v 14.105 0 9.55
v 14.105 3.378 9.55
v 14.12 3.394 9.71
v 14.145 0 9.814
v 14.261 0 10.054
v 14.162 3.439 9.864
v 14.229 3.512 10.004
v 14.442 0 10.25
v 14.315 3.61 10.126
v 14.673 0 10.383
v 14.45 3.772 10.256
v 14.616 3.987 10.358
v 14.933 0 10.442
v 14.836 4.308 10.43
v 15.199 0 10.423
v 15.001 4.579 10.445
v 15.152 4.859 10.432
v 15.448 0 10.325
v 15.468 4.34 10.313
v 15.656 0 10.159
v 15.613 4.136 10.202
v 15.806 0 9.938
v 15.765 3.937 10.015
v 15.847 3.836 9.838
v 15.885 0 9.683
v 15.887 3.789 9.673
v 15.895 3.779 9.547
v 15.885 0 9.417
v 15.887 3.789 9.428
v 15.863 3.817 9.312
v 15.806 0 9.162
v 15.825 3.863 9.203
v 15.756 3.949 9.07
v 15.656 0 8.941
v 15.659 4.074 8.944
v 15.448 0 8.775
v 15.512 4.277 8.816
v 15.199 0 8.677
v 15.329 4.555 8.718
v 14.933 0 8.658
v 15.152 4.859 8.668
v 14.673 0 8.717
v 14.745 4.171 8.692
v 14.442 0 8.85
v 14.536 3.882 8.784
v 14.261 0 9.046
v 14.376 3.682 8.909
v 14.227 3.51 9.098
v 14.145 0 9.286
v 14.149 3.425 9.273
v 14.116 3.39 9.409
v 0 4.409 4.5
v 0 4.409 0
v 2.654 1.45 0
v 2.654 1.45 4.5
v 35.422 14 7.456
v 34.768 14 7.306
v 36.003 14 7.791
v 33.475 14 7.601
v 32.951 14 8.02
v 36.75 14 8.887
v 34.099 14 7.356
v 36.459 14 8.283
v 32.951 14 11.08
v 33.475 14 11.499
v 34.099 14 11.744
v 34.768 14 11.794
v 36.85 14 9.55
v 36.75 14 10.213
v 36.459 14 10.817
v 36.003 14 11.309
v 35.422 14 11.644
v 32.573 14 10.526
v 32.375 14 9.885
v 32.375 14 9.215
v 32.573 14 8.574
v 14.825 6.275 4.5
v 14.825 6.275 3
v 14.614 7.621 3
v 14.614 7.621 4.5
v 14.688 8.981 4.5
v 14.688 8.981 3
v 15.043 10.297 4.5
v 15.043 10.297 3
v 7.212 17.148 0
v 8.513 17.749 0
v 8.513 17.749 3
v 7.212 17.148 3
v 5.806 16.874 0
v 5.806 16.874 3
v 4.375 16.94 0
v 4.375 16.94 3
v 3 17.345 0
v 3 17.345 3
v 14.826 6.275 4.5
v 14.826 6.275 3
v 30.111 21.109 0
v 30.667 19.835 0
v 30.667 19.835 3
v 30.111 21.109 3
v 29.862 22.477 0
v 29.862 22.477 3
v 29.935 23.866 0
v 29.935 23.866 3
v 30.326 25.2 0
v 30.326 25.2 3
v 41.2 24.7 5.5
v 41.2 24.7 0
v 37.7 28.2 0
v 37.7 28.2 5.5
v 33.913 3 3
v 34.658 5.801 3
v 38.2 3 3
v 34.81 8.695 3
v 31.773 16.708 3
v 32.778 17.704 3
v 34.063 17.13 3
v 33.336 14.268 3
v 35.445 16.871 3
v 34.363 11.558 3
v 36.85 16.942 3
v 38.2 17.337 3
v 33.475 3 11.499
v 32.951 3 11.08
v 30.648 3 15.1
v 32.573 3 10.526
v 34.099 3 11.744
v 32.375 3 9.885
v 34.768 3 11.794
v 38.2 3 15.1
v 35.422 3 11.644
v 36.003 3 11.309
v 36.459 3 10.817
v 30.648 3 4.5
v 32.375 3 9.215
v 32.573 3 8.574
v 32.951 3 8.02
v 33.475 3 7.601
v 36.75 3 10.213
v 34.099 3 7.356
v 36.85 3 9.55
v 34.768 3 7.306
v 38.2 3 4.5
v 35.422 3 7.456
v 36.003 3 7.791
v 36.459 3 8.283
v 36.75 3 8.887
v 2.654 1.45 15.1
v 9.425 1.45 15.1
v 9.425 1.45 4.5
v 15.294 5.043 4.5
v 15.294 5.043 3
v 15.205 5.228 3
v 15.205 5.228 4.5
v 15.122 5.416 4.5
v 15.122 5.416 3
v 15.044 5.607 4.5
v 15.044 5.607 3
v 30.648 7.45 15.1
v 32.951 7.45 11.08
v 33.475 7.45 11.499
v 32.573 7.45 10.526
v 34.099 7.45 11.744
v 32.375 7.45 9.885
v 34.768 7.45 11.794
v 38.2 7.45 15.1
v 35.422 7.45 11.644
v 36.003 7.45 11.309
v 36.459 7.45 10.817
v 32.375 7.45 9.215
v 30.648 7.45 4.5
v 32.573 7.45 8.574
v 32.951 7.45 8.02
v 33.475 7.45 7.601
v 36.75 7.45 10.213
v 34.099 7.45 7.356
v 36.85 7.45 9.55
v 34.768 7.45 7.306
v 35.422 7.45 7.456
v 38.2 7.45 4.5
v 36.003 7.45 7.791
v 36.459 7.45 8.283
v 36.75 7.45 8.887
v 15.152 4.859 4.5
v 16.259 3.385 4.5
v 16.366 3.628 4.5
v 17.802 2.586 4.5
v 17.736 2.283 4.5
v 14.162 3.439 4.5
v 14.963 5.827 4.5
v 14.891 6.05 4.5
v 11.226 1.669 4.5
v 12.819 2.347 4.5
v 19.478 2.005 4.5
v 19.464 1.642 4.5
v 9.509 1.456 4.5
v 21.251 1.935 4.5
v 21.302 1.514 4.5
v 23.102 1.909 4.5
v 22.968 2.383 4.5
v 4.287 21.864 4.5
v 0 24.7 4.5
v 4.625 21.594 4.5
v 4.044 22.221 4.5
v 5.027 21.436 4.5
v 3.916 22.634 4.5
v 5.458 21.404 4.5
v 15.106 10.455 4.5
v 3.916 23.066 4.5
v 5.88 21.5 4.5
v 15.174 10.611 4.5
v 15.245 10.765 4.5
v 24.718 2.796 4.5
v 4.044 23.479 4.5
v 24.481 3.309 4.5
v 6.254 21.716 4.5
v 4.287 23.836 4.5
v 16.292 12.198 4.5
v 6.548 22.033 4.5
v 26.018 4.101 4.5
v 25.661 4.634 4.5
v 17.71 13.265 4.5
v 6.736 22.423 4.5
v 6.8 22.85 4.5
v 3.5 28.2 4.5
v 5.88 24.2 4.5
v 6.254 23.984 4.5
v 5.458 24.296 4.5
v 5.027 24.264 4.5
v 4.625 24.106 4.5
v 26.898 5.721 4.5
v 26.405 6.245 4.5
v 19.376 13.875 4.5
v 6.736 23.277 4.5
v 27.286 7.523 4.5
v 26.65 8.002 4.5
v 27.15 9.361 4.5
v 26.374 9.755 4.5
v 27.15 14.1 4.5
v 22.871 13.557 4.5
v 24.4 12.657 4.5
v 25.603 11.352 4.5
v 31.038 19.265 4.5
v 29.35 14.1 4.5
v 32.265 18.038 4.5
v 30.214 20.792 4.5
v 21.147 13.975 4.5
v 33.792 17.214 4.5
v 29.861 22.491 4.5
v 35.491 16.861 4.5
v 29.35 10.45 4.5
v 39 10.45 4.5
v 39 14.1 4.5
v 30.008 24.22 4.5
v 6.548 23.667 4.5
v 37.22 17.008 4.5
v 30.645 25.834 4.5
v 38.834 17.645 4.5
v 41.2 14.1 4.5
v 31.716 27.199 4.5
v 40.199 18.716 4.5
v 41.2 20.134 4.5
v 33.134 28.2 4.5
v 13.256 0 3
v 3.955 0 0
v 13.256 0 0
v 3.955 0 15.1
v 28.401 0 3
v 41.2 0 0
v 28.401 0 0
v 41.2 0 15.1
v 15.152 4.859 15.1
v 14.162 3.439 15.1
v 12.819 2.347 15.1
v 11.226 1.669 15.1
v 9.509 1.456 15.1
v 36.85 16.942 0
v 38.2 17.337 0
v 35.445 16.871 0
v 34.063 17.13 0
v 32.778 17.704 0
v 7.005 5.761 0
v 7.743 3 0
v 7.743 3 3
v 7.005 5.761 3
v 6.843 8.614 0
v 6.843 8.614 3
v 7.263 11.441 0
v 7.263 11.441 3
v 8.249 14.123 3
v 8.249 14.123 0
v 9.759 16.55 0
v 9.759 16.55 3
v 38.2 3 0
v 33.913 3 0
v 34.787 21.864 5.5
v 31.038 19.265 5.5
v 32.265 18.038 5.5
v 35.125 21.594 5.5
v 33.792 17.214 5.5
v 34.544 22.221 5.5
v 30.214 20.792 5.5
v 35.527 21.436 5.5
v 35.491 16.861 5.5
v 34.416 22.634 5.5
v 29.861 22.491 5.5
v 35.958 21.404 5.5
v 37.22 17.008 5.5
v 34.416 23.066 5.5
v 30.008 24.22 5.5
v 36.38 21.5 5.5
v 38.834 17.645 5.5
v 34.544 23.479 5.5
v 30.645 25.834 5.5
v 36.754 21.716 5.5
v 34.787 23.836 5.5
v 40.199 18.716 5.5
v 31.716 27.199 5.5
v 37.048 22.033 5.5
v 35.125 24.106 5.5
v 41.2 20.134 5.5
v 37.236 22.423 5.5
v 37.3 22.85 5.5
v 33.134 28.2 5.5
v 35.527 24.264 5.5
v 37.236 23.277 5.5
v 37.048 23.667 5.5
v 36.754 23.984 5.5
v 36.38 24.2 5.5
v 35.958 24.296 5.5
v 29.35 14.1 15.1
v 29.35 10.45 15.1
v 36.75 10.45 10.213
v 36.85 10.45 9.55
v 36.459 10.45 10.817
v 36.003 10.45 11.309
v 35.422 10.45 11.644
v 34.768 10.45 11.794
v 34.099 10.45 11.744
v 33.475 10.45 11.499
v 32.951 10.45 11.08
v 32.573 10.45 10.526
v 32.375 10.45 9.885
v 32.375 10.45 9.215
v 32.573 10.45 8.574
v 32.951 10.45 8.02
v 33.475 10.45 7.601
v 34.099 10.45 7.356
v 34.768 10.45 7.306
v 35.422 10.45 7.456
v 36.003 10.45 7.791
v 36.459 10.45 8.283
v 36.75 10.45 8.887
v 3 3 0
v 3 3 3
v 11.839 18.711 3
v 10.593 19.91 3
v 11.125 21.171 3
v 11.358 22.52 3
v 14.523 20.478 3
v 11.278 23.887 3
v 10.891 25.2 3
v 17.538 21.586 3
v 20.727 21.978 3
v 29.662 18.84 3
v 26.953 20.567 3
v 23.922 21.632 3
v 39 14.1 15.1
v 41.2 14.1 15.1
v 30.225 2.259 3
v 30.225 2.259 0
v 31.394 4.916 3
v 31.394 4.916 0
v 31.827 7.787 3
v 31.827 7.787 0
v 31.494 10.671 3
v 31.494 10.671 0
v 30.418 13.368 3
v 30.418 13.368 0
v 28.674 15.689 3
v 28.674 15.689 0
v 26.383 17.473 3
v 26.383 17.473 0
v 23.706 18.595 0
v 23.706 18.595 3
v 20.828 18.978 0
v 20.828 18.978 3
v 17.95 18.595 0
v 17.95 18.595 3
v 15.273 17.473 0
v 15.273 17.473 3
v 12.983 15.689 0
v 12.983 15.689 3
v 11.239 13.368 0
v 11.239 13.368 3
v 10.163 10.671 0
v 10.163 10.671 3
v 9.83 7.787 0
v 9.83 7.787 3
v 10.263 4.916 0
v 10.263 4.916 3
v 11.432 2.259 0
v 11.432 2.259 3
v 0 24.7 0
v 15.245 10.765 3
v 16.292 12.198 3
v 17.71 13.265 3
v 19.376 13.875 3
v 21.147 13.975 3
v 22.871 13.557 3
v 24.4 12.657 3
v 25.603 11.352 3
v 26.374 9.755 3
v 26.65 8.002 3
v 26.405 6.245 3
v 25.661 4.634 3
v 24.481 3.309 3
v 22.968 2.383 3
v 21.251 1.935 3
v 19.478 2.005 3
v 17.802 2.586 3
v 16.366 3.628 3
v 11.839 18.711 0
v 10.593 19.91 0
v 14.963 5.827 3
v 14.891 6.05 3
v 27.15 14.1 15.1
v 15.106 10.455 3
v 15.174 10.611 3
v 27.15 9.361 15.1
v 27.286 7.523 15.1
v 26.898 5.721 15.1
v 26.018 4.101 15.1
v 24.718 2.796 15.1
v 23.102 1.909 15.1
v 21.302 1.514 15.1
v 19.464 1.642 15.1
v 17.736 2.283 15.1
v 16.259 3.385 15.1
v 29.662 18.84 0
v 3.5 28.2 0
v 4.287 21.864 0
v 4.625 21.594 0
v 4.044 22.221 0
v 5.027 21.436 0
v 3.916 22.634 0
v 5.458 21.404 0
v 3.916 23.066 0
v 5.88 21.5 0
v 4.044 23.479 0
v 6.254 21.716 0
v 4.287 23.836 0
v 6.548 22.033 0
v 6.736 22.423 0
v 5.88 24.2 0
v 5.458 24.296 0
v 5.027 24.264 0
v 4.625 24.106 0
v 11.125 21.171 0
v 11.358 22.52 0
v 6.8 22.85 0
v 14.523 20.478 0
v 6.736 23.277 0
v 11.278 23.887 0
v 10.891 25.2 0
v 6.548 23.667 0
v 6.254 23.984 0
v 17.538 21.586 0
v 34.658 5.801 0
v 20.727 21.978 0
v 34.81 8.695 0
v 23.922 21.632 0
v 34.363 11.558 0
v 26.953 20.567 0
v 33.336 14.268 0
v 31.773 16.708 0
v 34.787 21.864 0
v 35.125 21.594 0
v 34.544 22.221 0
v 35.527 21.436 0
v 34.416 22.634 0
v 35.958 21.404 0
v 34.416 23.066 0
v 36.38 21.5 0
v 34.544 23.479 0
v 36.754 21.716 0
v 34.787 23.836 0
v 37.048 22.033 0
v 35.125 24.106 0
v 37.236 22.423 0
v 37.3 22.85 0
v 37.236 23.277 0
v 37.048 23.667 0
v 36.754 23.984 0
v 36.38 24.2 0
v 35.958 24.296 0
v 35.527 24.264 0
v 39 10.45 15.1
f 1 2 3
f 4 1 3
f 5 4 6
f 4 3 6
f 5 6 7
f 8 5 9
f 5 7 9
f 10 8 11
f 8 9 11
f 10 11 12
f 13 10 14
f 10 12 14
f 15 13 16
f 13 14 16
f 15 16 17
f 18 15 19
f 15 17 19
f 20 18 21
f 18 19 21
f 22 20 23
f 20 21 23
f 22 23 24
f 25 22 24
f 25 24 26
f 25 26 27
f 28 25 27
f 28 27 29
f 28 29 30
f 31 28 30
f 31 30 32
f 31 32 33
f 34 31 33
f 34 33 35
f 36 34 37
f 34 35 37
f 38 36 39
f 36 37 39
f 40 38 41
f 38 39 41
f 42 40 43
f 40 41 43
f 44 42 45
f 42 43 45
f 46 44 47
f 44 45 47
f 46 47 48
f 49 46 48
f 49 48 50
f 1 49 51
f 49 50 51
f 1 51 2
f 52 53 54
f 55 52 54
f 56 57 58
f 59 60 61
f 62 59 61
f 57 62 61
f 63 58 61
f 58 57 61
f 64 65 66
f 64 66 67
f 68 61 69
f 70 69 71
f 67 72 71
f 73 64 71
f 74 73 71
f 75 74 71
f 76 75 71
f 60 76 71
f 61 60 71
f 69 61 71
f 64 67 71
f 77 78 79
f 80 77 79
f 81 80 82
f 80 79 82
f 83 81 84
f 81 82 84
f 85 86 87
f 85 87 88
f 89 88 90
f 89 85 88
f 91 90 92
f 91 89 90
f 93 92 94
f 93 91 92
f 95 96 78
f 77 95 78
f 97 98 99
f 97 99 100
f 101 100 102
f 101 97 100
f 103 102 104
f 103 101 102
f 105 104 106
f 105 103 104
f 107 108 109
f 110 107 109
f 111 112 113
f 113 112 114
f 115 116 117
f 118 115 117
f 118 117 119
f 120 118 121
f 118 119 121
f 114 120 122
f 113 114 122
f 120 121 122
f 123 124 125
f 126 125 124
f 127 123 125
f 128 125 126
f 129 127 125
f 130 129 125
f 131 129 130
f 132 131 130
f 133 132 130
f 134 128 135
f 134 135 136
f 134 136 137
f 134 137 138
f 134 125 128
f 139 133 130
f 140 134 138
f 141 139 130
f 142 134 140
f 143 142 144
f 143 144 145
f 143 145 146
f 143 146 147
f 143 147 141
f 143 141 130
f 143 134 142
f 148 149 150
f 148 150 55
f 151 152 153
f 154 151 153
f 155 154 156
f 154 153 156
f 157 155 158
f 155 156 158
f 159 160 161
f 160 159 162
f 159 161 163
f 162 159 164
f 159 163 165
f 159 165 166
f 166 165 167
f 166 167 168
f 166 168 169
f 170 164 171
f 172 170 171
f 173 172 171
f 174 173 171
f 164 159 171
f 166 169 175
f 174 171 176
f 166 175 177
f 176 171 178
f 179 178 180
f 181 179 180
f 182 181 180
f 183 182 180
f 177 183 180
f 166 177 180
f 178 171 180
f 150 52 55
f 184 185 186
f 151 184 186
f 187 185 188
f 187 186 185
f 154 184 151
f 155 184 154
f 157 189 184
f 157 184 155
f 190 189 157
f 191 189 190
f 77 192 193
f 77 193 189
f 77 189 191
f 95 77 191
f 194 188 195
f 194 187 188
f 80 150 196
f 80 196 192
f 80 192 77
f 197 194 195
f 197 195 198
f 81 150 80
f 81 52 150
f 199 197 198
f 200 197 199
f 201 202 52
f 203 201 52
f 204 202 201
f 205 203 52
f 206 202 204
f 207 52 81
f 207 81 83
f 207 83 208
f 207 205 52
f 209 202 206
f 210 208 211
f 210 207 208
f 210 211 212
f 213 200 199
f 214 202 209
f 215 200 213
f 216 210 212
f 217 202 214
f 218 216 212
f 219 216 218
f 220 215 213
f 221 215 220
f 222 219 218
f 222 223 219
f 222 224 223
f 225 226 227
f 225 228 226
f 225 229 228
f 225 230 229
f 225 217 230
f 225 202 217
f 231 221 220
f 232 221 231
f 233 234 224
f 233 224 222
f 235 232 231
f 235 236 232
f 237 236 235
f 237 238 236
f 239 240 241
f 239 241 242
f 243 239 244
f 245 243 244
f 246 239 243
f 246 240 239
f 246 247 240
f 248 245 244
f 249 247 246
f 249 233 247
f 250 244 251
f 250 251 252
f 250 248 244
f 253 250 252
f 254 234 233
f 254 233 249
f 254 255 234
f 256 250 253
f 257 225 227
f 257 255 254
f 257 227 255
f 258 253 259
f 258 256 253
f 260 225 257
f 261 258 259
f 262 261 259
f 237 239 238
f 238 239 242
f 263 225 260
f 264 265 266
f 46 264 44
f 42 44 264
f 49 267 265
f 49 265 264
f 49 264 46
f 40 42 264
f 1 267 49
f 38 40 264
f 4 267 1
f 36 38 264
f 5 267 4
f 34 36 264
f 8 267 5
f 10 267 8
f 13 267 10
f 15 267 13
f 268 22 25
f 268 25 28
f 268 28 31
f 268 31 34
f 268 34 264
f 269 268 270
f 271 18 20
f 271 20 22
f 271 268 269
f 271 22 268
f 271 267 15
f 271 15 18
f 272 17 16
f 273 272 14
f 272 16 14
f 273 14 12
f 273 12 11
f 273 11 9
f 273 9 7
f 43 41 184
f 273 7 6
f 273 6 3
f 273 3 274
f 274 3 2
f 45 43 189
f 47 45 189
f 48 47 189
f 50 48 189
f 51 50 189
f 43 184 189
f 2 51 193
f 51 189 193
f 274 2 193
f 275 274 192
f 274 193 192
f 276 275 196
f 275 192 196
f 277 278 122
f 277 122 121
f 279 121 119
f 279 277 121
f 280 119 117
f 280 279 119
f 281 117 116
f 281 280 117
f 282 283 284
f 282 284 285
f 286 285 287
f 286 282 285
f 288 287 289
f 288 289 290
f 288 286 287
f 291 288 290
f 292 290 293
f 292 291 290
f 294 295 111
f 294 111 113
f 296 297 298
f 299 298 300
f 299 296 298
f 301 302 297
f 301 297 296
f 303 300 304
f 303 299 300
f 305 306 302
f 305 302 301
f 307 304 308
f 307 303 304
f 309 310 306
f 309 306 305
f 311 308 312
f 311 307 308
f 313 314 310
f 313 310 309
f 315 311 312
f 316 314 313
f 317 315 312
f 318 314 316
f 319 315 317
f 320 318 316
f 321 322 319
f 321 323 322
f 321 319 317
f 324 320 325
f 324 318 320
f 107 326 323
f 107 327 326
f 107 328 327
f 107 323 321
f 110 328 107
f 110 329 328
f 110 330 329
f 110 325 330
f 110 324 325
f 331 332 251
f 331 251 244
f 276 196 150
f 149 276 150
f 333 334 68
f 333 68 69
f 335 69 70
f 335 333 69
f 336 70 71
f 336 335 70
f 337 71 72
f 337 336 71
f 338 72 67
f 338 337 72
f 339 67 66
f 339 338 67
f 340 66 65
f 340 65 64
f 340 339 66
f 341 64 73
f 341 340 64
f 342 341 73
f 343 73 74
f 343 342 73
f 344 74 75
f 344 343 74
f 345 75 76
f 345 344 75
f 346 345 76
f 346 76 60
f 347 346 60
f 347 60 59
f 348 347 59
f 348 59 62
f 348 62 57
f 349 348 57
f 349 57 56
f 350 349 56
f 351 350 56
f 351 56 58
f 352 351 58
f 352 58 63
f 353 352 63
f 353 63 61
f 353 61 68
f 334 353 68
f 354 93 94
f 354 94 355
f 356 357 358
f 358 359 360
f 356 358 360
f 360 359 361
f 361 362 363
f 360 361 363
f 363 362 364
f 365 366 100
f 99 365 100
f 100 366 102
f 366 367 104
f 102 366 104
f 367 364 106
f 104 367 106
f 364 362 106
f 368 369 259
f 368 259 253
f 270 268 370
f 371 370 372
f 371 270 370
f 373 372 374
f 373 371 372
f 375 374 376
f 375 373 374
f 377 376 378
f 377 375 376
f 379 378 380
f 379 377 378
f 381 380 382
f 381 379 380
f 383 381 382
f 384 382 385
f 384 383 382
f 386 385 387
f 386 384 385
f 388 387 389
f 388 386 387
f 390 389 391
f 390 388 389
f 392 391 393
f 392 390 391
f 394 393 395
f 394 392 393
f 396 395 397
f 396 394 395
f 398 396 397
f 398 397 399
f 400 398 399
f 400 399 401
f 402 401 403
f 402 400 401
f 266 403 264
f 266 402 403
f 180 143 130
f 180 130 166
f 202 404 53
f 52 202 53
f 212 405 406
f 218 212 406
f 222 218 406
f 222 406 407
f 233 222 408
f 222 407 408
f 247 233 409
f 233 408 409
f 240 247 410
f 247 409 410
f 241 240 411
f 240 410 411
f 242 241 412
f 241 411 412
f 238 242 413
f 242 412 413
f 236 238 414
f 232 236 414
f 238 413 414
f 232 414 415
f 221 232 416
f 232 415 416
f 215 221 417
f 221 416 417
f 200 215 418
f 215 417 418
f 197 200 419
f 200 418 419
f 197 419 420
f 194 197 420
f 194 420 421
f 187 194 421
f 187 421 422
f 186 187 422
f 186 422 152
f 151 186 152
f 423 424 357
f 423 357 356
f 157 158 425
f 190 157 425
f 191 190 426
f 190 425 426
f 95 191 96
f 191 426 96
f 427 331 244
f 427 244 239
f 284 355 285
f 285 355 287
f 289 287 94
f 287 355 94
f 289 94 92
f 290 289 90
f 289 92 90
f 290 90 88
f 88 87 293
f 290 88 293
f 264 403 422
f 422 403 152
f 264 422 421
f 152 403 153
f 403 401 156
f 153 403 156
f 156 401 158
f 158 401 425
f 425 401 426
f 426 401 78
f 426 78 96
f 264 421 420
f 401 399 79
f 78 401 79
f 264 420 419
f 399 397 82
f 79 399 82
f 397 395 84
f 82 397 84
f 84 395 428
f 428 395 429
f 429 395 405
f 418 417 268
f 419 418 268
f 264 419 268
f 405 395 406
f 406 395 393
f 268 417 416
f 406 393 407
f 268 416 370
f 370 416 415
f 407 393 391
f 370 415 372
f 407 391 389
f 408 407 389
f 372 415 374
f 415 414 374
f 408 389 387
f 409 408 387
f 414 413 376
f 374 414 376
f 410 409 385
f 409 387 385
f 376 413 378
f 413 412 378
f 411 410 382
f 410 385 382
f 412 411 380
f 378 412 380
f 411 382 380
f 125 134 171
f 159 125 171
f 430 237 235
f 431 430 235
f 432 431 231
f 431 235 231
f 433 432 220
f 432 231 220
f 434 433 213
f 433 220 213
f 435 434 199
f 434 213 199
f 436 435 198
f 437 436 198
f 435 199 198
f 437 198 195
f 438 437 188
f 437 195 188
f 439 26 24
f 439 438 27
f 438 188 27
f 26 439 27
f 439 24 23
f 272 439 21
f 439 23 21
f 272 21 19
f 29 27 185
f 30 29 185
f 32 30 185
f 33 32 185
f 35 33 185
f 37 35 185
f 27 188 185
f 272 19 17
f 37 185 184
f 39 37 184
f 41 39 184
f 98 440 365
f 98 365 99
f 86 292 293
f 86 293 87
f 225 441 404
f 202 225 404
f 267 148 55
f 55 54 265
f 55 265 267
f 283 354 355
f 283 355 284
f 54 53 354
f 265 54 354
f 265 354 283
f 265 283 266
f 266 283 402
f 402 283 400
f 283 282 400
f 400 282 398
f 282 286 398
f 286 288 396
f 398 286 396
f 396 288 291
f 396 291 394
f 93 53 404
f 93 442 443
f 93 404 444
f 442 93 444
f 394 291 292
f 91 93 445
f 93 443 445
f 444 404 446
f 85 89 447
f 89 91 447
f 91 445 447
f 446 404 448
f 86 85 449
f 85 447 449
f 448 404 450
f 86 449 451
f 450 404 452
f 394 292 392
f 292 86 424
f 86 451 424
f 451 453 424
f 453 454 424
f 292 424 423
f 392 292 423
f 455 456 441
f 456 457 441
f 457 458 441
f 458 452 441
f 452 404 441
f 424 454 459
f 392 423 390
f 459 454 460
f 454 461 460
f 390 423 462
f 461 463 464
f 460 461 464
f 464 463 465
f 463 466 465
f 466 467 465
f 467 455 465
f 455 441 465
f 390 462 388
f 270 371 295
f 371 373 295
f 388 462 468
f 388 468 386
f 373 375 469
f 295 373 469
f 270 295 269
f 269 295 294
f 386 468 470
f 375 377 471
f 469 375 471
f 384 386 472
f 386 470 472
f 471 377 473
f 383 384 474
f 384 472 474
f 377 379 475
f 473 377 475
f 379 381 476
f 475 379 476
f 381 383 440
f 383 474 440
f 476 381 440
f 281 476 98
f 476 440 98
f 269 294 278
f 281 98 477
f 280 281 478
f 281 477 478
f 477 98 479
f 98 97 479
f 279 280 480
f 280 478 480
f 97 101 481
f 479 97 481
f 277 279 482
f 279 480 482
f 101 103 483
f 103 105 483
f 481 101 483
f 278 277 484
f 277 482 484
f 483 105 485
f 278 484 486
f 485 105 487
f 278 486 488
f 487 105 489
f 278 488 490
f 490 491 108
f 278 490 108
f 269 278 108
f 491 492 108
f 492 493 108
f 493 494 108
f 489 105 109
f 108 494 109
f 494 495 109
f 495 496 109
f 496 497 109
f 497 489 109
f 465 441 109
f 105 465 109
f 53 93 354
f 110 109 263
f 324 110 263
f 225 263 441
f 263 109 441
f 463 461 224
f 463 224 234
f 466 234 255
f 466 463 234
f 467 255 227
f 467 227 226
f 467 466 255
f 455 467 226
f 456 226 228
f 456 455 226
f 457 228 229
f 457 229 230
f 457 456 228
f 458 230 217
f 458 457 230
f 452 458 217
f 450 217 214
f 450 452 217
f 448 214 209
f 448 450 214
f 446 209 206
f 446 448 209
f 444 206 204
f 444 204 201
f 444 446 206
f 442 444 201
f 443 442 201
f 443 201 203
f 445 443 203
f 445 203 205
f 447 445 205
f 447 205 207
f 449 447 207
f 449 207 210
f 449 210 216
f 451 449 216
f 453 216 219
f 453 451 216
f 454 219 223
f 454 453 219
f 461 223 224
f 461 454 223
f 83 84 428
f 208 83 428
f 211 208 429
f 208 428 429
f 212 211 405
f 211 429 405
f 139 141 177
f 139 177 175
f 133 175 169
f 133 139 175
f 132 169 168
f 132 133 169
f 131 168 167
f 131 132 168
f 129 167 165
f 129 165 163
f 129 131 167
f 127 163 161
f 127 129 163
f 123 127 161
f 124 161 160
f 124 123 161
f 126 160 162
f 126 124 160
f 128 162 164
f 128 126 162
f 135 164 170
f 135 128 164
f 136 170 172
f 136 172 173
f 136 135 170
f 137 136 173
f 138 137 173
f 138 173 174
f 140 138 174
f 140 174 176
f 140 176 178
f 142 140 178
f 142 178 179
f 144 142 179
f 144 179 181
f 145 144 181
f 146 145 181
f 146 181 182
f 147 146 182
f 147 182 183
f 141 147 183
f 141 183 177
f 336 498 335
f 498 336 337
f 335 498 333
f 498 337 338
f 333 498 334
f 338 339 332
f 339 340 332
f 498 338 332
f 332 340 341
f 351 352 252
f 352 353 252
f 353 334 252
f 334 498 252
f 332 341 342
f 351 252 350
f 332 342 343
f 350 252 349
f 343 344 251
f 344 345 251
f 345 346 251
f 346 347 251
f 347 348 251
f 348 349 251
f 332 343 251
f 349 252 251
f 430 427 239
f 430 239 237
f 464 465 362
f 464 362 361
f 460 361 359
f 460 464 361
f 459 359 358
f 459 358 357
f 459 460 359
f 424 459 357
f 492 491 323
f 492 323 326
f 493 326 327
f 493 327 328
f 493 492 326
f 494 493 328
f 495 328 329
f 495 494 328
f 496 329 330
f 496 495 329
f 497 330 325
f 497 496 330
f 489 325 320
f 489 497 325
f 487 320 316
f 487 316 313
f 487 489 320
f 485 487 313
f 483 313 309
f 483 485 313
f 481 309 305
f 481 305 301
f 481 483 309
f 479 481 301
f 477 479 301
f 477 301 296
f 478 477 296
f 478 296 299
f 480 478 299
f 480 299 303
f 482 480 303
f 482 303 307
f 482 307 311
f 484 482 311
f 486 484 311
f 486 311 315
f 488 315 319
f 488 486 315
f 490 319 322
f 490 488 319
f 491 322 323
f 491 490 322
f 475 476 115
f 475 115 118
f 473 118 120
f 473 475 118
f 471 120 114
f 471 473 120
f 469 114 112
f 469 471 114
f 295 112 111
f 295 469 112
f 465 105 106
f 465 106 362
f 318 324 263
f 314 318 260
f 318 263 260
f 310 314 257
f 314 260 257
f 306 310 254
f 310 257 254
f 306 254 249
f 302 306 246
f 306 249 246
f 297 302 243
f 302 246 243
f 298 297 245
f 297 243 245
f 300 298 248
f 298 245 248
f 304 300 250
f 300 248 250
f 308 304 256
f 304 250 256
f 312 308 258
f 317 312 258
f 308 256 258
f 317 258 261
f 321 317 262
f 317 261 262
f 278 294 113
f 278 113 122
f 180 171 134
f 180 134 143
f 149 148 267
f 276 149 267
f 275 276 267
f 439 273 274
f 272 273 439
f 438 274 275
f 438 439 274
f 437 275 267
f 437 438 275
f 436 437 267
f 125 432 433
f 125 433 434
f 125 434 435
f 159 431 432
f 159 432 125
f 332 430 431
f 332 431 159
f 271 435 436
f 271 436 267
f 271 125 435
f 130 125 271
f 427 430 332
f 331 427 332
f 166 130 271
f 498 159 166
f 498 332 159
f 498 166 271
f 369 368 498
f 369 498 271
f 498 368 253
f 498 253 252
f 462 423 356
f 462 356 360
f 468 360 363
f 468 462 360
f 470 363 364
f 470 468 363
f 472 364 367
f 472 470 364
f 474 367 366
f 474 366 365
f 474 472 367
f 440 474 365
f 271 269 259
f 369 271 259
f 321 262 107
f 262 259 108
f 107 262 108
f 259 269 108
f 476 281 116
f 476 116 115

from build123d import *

# Parameters (mm, degrees)
F0_W           = 7.551756
F0_H           = 4.45
F1_DEPTH       = 15.1
F0_R           = 1.45
F0_R_2         = 1.44
F2_DEPTH       = 4.5
F3_DEPTH       = 5.5
F4_R           = 11
F5_DEPTH       = 3
F6_R           = 2.25
F7_DEPTH       = 14
F8_D           = 1.79
F8_CBORE_D     = 1.79
F8_CBORE_DEPTH = 1.45


with BuildPart() as f1:
    # F0 (on Top) → F1 (new body)
    with BuildSketch(Plane.XY):
        with BuildLine():
            Line((2.65426, 1.450184), (3.954988, 0))
            Line((3.954988, 0), (41.2, 0))
            Line((41.2, 0), (41.2, 10.45))
            Line((41.2, 10.45), (41.2, 14.1))
            Line((41.2, 14.1), (39, 14.1))
            Line((39, 14.1), (39, 10.45))
            Line((39, 10.45), (29.35, 10.45))
            Line((29.35, 10.45), (29.35, 14.1))
            Line((29.35, 14.1), (27.15, 14.1))
            Line((27.15, 14.1), (27.15, 10.45))
            Line((27.15, 10.45), (27.15, 9.360534))
            ThreePointArc((27.15, 9.360534), (23.102126, 1.90917), (15.151799, 4.858818))
            ThreePointArc((15.151799, 4.858818), (12.818666, 2.347317), (9.508541, 1.45613))
            Line((9.508541, 1.45613), (9.425105, 1.450184))
            Line((9.425105, 1.450184), (2.65426, 1.450184))
        make_face()
        with Locations((34.424122, 5.225)):
            Rectangle(F0_W, F0_H, mode=Mode.SUBTRACT)
    extrude(amount=F1_DEPTH)

    # F0 (on Top) → F2 (join)
    with BuildSketch(Plane.XY):
        with BuildLine():
            Line((0, 4.409424), (2.65426, 1.450184))
            Line((2.65426, 1.450184), (9.425105, 1.450184))
            Line((9.425105, 1.450184), (9.508541, 1.45613))
            ThreePointArc((9.508541, 1.45613), (12.818666, 2.347317), (15.151799, 4.858818))
            ThreePointArc((15.151799, 4.858818), (23.102126, 1.90917), (27.15, 9.360534))
            Line((27.15, 9.360534), (27.15, 10.45))
            Line((27.15, 10.45), (27.15, 14.1))
            Line((27.15, 14.1), (29.35, 14.1))
            Line((29.35, 14.1), (29.35, 10.45))
            Line((29.35, 10.45), (39, 10.45))
            Line((39, 10.45), (39, 14.1))
            Line((39, 14.1), (41.2, 14.1))
            Line((41.2, 14.1), (41.2, 20.133845))
            ThreePointArc((41.2, 20.133845), (31.607359, 18.607359), (33.133845, 28.2))
            Line((33.133845, 28.2), (8.066155, 28.2))
            ThreePointArc((8.066155, 28.2), (9.592641, 18.607359), (0, 20.133845))
            Line((0, 20.133845), (0, 4.409424))
        make_face()
        with BuildLine():
            ThreePointArc((15.044259, 5.607124), (11.225264, 2.020343), (6.018226, 2.600408))
            ThreePointArc((6.018226, 2.600408), (4.726842, 11.501576), (13.680284, 12.358524))
            ThreePointArc((13.680284, 12.358524), (14.464459, 11.395564), (15.042763, 10.296571))
            ThreePointArc((15.042763, 10.296571), (15.139305, 10.532994), (15.245029, 10.765456))
            ThreePointArc((15.245029, 10.765456), (26.649775, 8.002179), (15.294389, 5.042598))
            ThreePointArc((15.294389, 5.042598), (15.162653, 5.321905), (15.044259, 5.607124))
        make_face(mode=Mode.SUBTRACT)
        with BuildLine():
            Line((0, 24.7), (0, 20.133845))
            ThreePointArc((0, 20.133845), (9.592641, 18.607359), (8.066155, 28.2))
            Line((8.066155, 28.2), (3.5, 28.2))
            Line((3.5, 28.2), (0, 24.7))
        make_face()
        with Locations((5.35, 22.85)):
            Circle(F0_R, mode=Mode.SUBTRACT)
        with BuildLine():
            ThreePointArc((13.680284, 12.358524), (4.726842, 11.501576), (6.018226, 2.600408))
            ThreePointArc((6.018226, 2.600408), (11.225264, 2.020343), (15.044259, 5.607124))
            ThreePointArc((15.044259, 5.607124), (14.926049, 5.938205), (14.825812, 6.275163))
            Line((14.825812, 6.275163), (14.824682, 6.275163))
            ThreePointArc((14.824682, 6.275163), (14.615506, 8.303124), (15.042763, 10.296571))
            ThreePointArc((15.042763, 10.296571), (14.464459, 11.395564), (13.680284, 12.358524))
        make_face()
        with Locations((9.25, 7.95)):
            Circle(F0_R_2, mode=Mode.SUBTRACT)
        with Locations((9.25, 7.95)):
            Circle(F0_R_2)
        with Locations((34.424122, 5.225)):
            Rectangle(F0_W, F0_H)
    extrude(amount=F2_DEPTH)

    # F0 (on Top) → F3 (join)
    with BuildSketch(Plane.XY):
        with BuildLine():
            ThreePointArc((33.133845, 28.2), (31.607359, 18.607359), (41.2, 20.133845))
            Line((41.2, 20.133845), (41.2, 24.7))
            Line((41.2, 24.7), (37.7, 28.2))
            Line((37.7, 28.2), (33.133845, 28.2))
        make_face()
        with Locations((35.85, 22.85)):
            Circle(F0_R, mode=Mode.SUBTRACT)
    extrude(amount=F3_DEPTH)

    # F4 (on Top) → F5 (cut)
    with BuildSketch(Plane.XY):
        with BuildLine():
            ThreePointArc((8.513082, 17.748509), (5.805837, 16.873794), (3, 17.344523))
            Line((3, 17.344523), (3, 3))
            Line((3, 3), (7.743291, 3))
            ThreePointArc((7.743291, 3), (6.98063, 10.038164), (9.758824, 16.549619))
            Line((9.758824, 16.549619), (8.513082, 17.748509))
        make_face()
        with Locations((20.828264, 7.978301)):
            Circle(F4_R)
        with BuildLine():
            Line((38.2, 3), (38.2, 17.33704))
            ThreePointArc((38.2, 17.33704), (35.445261, 16.871427), (32.77831, 17.703745))
            Line((32.77831, 17.703745), (31.773144, 16.708111))
            ThreePointArc((31.773144, 16.708111), (34.660709, 10.137804), (33.913237, 3))
            Line((33.913237, 3), (38.2, 3))
        make_face()
        with BuildLine():
            ThreePointArc((30.667119, 19.835147), (29.862233, 22.47726), (30.326221, 25.2))
            Line((30.326221, 25.2), (10.891282, 25.2))
            ThreePointArc((10.891282, 25.2), (11.357854, 22.520378), (10.593366, 19.910087))
            Line((10.593366, 19.910087), (11.839107, 18.711197))
            ThreePointArc((11.839107, 18.711197), (20.727473, 21.977938), (29.661953, 18.839513))
            Line((29.661953, 18.839513), (30.667119, 19.835147))
        make_face()
    extrude(amount=F5_DEPTH, mode=Mode.SUBTRACT)

    # F6 (on Front) → F7 (join)
    with BuildSketch(Plane.XZ):
        with Locations((34.6, 9.55)):
            Circle(F6_R)
    extrude(amount=-F7_DEPTH)

    # F8 (through all)
    with Locations(Plane.XZ):
        with Locations((15, 9.55)):
            CounterBoreHole(F8_D / 2, F8_CBORE_D / 2, F8_CBORE_DEPTH)


solid = f1.part
